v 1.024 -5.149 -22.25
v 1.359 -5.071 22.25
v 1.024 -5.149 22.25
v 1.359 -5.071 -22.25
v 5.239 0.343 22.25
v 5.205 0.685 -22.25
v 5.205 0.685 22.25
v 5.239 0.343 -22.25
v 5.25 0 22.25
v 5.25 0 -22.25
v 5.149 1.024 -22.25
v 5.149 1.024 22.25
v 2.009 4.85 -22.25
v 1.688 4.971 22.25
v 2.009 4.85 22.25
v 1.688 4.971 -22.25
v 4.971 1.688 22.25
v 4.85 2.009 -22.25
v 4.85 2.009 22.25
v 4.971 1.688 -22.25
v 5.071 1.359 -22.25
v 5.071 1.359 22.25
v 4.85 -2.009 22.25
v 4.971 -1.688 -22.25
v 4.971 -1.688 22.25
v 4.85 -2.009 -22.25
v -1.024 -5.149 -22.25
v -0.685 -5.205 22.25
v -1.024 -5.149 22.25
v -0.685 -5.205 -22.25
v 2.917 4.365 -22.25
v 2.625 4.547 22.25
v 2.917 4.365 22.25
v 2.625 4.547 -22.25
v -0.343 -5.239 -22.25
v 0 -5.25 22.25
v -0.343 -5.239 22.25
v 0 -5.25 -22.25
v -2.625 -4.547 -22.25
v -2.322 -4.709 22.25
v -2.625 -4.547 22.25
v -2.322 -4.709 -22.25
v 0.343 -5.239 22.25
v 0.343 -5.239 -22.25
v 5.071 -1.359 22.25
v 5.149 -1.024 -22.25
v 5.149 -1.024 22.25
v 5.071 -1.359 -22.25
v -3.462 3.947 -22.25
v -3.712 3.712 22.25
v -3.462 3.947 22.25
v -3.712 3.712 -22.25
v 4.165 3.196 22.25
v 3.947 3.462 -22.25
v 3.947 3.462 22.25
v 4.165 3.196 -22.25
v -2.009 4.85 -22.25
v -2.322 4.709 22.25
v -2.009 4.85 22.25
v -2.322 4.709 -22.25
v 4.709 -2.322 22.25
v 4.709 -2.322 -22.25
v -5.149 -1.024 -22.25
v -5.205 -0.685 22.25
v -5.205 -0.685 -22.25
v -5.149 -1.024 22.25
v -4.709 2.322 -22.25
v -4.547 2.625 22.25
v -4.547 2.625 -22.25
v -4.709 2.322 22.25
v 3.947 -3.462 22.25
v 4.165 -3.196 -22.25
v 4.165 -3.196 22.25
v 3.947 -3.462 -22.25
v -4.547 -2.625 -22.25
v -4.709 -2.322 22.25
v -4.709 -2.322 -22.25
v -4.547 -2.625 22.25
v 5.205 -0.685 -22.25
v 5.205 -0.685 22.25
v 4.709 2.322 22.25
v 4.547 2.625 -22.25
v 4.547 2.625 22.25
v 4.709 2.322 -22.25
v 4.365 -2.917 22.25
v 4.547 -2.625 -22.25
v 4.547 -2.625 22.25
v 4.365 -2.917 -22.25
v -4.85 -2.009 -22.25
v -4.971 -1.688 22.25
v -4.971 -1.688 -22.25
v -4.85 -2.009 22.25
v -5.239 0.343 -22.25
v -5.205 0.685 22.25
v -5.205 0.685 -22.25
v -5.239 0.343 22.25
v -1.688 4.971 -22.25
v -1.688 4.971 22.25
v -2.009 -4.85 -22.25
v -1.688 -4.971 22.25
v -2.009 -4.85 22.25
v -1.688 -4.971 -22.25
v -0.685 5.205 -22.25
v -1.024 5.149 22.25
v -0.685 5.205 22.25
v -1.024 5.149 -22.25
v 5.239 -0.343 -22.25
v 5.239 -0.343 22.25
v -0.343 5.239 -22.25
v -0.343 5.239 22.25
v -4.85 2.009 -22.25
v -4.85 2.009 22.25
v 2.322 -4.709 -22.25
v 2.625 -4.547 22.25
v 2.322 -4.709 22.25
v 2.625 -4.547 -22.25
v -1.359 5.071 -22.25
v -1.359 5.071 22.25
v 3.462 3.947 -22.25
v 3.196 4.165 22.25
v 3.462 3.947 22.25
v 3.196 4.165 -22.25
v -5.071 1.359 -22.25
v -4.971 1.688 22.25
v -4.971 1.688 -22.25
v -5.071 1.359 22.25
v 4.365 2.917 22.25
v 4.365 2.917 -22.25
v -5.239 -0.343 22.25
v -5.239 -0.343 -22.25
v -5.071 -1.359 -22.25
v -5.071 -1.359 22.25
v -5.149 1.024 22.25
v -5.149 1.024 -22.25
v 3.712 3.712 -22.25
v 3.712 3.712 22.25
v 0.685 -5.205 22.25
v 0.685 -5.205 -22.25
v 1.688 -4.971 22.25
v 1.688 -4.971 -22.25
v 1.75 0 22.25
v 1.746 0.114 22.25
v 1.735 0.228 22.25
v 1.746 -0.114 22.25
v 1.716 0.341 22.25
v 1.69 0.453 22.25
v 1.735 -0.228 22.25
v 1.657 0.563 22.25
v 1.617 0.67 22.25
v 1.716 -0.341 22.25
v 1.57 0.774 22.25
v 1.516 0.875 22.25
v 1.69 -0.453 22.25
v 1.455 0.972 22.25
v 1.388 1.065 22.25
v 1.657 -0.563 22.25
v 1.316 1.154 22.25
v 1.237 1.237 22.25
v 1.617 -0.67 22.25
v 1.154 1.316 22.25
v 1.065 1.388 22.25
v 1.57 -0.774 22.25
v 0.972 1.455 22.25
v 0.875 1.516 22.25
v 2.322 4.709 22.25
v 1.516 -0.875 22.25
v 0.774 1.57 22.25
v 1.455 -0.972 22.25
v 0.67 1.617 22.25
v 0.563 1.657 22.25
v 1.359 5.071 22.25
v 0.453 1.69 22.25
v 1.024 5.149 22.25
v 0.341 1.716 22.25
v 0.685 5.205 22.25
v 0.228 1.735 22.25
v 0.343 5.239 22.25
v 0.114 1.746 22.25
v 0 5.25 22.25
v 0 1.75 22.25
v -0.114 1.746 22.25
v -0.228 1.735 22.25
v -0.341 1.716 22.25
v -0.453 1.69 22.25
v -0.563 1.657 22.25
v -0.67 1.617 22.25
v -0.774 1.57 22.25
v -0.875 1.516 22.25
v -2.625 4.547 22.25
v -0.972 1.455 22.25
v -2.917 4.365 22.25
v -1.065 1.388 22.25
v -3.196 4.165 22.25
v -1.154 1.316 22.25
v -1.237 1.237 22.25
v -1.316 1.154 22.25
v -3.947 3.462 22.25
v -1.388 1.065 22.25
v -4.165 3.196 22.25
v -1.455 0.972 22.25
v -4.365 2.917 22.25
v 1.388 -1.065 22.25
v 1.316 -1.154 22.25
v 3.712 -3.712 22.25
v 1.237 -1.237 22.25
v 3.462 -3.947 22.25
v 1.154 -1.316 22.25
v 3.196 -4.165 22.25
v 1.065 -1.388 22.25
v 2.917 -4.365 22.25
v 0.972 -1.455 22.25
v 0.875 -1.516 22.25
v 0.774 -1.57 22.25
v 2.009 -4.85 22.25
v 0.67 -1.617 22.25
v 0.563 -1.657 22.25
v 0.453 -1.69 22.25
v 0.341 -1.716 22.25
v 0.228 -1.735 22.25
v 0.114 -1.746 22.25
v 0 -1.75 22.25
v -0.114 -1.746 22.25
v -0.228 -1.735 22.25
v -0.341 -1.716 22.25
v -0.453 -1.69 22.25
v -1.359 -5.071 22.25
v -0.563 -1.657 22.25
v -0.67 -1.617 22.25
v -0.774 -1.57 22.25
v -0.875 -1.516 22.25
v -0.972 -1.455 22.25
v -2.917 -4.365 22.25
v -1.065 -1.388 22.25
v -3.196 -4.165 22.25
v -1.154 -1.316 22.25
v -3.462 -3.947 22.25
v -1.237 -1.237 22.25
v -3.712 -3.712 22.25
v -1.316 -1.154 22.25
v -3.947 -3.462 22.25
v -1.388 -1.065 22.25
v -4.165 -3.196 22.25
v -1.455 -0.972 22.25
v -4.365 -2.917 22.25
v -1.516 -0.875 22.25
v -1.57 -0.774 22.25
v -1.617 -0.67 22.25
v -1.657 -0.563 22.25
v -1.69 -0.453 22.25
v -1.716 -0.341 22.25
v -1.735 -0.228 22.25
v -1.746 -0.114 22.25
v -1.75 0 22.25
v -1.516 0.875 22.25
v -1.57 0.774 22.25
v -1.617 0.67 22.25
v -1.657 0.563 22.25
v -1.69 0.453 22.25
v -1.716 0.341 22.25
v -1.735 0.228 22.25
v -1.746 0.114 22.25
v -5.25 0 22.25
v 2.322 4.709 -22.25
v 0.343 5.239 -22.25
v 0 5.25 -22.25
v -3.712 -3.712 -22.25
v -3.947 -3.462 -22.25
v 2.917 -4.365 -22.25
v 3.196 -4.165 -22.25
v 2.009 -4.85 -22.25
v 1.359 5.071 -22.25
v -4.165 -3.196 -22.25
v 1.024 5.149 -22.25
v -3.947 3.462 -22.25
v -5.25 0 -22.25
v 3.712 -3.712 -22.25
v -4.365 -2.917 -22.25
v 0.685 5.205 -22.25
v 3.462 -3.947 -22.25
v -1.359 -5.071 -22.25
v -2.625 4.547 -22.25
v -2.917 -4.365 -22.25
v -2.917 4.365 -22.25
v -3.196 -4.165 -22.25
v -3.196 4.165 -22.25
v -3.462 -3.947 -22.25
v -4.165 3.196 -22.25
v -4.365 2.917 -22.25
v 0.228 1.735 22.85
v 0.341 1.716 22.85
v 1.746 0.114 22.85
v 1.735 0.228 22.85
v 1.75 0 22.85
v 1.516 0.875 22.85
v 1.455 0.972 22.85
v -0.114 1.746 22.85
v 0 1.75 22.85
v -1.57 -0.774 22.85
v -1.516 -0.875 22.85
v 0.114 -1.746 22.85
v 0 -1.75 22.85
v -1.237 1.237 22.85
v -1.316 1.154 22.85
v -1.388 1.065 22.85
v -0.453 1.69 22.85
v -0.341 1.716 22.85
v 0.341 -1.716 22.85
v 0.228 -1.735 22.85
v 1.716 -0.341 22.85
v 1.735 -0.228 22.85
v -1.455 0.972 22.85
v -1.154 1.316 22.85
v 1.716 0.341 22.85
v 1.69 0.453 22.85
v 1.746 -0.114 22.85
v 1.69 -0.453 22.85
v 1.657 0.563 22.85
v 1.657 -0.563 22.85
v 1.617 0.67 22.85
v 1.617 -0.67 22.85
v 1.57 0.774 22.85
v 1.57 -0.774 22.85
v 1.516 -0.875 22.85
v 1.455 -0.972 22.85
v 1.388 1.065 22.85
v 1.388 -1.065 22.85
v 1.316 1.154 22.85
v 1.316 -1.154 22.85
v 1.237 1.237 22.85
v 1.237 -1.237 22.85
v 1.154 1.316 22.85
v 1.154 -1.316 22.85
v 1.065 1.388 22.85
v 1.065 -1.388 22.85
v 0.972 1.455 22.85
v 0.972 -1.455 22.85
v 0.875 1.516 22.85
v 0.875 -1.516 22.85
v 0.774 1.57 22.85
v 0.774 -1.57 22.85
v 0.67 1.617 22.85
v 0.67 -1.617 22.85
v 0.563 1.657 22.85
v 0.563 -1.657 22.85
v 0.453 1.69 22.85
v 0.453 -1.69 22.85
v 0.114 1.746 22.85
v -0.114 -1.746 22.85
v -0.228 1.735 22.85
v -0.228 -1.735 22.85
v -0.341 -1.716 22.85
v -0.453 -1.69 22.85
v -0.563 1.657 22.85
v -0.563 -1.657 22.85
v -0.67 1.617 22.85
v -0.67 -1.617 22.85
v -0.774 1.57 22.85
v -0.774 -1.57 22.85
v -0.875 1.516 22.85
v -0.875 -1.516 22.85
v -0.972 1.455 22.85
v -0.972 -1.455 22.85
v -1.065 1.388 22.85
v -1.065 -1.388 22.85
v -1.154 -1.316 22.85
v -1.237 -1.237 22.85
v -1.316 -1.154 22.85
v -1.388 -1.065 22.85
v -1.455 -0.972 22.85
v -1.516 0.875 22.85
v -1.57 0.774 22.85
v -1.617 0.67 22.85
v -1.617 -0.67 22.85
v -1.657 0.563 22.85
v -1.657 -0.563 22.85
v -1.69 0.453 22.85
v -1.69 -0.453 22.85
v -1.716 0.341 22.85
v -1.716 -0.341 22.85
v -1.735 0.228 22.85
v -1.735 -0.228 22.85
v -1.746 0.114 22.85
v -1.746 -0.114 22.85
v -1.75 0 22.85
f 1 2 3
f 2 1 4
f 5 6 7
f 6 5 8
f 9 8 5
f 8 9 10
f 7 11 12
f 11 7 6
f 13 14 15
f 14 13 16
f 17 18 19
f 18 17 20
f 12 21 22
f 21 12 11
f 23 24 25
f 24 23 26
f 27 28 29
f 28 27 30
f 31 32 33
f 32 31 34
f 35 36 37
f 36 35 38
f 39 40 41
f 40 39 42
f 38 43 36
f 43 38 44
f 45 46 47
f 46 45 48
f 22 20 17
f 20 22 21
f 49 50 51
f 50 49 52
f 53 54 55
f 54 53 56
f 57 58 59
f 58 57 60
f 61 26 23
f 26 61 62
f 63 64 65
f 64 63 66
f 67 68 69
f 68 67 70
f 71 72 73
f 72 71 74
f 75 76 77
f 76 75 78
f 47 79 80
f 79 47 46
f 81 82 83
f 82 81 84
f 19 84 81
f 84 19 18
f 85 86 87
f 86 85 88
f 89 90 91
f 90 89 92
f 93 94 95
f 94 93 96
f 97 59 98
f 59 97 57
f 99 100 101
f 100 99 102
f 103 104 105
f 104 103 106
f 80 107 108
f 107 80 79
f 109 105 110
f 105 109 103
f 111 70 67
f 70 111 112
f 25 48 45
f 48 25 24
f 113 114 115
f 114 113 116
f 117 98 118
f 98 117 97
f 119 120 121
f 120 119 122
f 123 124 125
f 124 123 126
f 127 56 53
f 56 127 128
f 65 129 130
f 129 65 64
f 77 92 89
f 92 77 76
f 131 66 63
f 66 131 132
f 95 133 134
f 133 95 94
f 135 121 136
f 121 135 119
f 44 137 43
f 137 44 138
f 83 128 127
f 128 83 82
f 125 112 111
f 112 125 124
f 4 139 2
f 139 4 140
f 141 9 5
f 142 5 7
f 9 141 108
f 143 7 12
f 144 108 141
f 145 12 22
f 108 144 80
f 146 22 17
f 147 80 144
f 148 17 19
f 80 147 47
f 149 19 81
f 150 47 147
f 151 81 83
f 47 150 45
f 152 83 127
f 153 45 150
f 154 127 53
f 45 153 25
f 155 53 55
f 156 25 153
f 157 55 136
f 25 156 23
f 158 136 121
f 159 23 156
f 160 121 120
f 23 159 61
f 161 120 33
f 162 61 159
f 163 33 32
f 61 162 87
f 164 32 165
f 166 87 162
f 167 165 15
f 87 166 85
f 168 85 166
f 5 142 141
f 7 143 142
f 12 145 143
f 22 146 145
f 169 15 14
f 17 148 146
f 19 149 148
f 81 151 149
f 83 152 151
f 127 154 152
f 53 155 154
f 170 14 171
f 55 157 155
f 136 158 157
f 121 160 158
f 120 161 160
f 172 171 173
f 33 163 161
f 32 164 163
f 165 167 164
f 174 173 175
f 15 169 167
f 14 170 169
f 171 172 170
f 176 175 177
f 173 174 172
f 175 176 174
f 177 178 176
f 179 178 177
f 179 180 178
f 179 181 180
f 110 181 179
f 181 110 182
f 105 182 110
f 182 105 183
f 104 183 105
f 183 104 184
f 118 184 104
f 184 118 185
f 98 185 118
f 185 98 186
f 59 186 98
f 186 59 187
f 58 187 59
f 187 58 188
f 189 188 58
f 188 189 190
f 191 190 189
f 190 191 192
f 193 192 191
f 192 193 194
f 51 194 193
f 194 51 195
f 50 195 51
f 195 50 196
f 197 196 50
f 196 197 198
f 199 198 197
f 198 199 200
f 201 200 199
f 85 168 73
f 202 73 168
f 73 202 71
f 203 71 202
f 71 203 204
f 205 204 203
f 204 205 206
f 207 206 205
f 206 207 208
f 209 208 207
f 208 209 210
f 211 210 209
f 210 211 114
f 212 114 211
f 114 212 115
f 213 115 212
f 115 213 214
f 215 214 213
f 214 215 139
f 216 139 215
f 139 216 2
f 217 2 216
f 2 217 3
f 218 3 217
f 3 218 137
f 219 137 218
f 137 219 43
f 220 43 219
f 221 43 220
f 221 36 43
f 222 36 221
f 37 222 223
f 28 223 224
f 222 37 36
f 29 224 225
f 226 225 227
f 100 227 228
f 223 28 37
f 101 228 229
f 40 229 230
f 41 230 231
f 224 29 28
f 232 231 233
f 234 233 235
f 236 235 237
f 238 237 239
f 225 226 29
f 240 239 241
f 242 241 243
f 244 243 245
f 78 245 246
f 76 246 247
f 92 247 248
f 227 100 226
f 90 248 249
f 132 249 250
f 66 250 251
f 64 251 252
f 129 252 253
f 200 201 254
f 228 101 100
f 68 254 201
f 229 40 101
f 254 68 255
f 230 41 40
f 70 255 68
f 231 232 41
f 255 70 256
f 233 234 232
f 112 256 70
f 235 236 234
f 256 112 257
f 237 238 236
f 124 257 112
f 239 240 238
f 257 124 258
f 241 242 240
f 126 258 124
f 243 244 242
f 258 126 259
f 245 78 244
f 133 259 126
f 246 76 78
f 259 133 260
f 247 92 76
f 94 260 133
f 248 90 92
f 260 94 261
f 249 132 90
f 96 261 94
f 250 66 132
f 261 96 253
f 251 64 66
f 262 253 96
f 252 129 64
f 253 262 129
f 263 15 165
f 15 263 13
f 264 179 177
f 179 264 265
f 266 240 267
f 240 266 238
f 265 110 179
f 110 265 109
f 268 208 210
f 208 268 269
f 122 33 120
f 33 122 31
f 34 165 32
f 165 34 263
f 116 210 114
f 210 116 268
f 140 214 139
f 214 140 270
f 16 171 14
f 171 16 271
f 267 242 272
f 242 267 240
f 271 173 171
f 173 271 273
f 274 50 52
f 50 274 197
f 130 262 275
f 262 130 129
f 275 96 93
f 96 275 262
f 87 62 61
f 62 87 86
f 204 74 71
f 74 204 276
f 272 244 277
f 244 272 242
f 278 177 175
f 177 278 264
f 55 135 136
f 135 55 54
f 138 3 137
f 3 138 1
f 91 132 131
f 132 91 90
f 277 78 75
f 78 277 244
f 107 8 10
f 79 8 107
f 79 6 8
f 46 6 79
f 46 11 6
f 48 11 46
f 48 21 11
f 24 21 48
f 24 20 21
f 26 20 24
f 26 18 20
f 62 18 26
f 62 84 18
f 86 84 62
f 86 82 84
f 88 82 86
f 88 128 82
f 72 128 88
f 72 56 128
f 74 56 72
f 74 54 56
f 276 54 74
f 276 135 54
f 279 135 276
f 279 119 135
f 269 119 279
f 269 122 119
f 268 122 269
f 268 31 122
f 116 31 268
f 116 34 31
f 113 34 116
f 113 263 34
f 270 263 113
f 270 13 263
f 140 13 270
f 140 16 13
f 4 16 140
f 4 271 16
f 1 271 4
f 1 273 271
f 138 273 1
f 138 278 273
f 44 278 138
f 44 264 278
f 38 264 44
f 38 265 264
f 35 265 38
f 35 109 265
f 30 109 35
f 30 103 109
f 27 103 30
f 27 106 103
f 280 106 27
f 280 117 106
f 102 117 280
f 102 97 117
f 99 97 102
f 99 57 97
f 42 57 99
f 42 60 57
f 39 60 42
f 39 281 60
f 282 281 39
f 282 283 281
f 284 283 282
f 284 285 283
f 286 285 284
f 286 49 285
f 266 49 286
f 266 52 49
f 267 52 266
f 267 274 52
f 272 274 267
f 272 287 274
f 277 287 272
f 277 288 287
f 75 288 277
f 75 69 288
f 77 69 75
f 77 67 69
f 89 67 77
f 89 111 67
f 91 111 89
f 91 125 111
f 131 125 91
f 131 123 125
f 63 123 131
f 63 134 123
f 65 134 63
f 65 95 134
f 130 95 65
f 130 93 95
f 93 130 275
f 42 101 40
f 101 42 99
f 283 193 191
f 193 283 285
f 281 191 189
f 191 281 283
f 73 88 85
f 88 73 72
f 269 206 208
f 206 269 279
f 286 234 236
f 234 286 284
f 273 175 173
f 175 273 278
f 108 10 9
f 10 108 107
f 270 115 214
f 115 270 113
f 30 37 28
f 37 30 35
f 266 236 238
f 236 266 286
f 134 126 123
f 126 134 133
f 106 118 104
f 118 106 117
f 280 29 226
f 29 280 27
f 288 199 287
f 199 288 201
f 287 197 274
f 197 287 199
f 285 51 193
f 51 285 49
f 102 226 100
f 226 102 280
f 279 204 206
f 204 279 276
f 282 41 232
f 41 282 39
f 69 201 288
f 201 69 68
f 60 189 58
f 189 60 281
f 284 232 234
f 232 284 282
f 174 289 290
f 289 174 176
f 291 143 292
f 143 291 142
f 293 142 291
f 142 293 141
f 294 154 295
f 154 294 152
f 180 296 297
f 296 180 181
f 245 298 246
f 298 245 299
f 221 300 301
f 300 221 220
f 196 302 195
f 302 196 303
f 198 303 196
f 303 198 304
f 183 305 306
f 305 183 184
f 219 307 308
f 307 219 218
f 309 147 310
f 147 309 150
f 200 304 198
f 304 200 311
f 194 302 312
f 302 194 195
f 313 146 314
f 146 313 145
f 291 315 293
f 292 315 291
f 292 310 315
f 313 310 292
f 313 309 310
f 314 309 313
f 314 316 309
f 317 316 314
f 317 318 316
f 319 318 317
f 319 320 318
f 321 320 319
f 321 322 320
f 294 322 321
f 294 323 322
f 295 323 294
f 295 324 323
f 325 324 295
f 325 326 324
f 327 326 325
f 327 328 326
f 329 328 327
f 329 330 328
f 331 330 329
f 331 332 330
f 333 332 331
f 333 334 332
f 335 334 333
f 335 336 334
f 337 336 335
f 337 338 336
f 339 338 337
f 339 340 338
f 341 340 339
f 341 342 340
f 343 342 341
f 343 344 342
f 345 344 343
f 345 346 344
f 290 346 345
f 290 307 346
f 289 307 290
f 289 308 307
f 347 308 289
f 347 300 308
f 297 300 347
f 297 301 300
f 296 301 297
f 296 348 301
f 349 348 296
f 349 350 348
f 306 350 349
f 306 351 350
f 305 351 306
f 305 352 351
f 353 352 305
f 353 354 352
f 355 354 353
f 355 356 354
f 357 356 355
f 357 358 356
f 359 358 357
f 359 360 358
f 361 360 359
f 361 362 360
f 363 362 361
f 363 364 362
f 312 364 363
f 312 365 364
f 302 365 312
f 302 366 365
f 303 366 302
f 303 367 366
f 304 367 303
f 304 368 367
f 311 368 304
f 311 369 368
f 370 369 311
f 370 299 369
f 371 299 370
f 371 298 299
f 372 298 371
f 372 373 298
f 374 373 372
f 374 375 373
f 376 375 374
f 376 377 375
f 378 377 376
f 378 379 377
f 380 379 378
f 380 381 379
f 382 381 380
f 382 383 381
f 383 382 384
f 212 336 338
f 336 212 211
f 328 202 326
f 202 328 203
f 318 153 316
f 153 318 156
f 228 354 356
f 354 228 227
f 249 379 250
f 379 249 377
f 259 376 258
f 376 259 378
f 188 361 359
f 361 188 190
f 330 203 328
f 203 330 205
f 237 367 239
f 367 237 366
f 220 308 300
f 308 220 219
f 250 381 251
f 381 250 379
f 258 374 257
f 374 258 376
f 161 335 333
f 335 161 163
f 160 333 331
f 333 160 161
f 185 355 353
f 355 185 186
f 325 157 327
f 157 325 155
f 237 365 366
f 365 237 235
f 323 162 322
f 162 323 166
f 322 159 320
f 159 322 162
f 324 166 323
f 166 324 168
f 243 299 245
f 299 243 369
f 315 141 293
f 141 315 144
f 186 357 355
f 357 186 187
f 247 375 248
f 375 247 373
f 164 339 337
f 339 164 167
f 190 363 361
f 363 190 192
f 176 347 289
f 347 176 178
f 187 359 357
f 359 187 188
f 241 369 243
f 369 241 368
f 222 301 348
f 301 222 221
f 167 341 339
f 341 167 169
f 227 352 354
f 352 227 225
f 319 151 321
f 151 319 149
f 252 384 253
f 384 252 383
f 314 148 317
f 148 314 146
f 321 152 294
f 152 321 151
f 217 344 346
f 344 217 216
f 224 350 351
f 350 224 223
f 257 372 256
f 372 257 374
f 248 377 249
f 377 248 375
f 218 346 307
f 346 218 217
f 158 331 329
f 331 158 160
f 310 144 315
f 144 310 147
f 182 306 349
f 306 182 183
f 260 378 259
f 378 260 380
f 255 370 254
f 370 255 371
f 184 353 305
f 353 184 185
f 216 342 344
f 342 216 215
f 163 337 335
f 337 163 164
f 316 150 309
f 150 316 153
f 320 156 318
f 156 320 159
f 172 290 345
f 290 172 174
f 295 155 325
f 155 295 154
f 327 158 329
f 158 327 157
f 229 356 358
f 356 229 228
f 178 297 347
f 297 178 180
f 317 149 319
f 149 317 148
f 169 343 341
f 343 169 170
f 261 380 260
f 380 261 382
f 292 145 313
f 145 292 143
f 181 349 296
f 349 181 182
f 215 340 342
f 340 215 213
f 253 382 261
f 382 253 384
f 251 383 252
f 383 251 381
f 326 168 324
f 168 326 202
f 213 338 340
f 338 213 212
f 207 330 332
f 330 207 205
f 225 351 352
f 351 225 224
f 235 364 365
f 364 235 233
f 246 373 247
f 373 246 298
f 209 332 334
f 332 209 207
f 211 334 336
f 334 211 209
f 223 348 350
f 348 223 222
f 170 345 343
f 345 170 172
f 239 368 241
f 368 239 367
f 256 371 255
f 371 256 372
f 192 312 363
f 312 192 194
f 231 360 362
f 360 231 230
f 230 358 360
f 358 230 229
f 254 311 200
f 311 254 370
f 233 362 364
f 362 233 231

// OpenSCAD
$fn=96;

module battery_cell(height=44.5, diameter=10.5, cap_h=1.2, cap_d=5.0, button_h=0.6, button_d=3.5) {
    r = diameter/2;
    union() {
        translate([0,0,-height/2])
            cylinder(h=height, r=r);

        translate([0,0,height/2 - cap_h])
            cylinder(h=cap_h, r=cap_d/2);

        translate([0,0,height/2])
            cylinder(h=button_h, r=button_d/2);
    }
}

battery_cell();
